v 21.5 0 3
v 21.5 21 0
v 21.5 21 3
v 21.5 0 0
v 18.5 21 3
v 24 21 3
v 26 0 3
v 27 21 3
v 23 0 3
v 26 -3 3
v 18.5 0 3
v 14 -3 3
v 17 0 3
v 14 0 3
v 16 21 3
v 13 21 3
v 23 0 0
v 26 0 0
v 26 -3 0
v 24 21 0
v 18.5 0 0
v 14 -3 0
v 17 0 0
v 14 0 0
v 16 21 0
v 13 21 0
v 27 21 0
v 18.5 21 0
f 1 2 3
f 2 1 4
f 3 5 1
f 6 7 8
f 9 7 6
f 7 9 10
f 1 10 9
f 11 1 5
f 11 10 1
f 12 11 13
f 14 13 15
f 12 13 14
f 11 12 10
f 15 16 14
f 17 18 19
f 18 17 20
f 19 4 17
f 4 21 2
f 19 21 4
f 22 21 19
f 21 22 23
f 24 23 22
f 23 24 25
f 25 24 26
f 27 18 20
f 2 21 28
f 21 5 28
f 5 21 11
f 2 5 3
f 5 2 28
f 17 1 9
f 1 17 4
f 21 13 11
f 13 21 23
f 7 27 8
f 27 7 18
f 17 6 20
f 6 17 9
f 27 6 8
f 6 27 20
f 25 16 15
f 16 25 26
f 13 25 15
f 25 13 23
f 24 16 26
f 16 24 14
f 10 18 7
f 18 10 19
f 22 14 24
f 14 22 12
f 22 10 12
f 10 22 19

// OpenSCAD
use <MCAD/regular_shapes.scad>

hole = [14, 12, 7];
t = 1.6;
ring_t = 1.5;
eps = 0.5;
clip_fill = 0.3;
r = 12/2;

module socket(){
    difference(){
        cube(hole + [t, 0, t], center=true);
        cube(hole, center=true);
    }
    translate([0, hole.y/2 + r+ring_t, -hole.z/2-ring_t])
    torus2(r+ring_t, ring_t, $fn=20);
}

module half_clip(){
    y = hole.y + 2*eps;
    x = hole.x*0.5*clip_fill;
    z = hole.z - 2*eps;
    translate([hole.x/2 - x/2 - eps, 0, 0]){
        cube([x, y, z], center=true);
        translate([0, y/2, -z/2])
        linear_extrude(height=z){
            polygon([
                [x*1.5, 0],
                [-x/2, 0],
                [-x/2, 5*x],
                [x/2, 5*x]
            ]);
        }
    }
    translate([0, -y/2-x/2, 0])
    cube([hole.x-2*eps, x, z], center=true);
    translate([0, -y/2-x/2-r-ring_t, ring_t-z/2])
    torus2(r+ring_t, ring_t, $fn=20);
}

module clip(){
    half_clip();
    mirror([1, 0, 0])
    half_clip();
}

module prong(t, bw, tw, l){
    linear_extrude(height=t){
        polygon([
            [t/2 + bw, 0],
            [t/2 + bw + t, 0],
            [t/2 + tw + t, l],
            [t/2 + tw, l]
        ]);
    }
}

module fork(t=3, bw=1.5, tw=2.5, l=21){
    translate([0, l/2, t/2])
    cube([t, l, t], center=true);
    prong(t, bw, tw, l);
    mirror([1, 0, 0])
    prong(t, bw, tw, l);
    translate([-t*1.5-bw, -t, 0])
    cube([bw*2+3*t, t, t]);
}

//translate([0, hole.y + 1*hole.x, eps + (hole.y - hole.z)/2])
//rotate([90, 0, 0])
//socket();
//clip();

translate([20, 0, 0])
fork();
